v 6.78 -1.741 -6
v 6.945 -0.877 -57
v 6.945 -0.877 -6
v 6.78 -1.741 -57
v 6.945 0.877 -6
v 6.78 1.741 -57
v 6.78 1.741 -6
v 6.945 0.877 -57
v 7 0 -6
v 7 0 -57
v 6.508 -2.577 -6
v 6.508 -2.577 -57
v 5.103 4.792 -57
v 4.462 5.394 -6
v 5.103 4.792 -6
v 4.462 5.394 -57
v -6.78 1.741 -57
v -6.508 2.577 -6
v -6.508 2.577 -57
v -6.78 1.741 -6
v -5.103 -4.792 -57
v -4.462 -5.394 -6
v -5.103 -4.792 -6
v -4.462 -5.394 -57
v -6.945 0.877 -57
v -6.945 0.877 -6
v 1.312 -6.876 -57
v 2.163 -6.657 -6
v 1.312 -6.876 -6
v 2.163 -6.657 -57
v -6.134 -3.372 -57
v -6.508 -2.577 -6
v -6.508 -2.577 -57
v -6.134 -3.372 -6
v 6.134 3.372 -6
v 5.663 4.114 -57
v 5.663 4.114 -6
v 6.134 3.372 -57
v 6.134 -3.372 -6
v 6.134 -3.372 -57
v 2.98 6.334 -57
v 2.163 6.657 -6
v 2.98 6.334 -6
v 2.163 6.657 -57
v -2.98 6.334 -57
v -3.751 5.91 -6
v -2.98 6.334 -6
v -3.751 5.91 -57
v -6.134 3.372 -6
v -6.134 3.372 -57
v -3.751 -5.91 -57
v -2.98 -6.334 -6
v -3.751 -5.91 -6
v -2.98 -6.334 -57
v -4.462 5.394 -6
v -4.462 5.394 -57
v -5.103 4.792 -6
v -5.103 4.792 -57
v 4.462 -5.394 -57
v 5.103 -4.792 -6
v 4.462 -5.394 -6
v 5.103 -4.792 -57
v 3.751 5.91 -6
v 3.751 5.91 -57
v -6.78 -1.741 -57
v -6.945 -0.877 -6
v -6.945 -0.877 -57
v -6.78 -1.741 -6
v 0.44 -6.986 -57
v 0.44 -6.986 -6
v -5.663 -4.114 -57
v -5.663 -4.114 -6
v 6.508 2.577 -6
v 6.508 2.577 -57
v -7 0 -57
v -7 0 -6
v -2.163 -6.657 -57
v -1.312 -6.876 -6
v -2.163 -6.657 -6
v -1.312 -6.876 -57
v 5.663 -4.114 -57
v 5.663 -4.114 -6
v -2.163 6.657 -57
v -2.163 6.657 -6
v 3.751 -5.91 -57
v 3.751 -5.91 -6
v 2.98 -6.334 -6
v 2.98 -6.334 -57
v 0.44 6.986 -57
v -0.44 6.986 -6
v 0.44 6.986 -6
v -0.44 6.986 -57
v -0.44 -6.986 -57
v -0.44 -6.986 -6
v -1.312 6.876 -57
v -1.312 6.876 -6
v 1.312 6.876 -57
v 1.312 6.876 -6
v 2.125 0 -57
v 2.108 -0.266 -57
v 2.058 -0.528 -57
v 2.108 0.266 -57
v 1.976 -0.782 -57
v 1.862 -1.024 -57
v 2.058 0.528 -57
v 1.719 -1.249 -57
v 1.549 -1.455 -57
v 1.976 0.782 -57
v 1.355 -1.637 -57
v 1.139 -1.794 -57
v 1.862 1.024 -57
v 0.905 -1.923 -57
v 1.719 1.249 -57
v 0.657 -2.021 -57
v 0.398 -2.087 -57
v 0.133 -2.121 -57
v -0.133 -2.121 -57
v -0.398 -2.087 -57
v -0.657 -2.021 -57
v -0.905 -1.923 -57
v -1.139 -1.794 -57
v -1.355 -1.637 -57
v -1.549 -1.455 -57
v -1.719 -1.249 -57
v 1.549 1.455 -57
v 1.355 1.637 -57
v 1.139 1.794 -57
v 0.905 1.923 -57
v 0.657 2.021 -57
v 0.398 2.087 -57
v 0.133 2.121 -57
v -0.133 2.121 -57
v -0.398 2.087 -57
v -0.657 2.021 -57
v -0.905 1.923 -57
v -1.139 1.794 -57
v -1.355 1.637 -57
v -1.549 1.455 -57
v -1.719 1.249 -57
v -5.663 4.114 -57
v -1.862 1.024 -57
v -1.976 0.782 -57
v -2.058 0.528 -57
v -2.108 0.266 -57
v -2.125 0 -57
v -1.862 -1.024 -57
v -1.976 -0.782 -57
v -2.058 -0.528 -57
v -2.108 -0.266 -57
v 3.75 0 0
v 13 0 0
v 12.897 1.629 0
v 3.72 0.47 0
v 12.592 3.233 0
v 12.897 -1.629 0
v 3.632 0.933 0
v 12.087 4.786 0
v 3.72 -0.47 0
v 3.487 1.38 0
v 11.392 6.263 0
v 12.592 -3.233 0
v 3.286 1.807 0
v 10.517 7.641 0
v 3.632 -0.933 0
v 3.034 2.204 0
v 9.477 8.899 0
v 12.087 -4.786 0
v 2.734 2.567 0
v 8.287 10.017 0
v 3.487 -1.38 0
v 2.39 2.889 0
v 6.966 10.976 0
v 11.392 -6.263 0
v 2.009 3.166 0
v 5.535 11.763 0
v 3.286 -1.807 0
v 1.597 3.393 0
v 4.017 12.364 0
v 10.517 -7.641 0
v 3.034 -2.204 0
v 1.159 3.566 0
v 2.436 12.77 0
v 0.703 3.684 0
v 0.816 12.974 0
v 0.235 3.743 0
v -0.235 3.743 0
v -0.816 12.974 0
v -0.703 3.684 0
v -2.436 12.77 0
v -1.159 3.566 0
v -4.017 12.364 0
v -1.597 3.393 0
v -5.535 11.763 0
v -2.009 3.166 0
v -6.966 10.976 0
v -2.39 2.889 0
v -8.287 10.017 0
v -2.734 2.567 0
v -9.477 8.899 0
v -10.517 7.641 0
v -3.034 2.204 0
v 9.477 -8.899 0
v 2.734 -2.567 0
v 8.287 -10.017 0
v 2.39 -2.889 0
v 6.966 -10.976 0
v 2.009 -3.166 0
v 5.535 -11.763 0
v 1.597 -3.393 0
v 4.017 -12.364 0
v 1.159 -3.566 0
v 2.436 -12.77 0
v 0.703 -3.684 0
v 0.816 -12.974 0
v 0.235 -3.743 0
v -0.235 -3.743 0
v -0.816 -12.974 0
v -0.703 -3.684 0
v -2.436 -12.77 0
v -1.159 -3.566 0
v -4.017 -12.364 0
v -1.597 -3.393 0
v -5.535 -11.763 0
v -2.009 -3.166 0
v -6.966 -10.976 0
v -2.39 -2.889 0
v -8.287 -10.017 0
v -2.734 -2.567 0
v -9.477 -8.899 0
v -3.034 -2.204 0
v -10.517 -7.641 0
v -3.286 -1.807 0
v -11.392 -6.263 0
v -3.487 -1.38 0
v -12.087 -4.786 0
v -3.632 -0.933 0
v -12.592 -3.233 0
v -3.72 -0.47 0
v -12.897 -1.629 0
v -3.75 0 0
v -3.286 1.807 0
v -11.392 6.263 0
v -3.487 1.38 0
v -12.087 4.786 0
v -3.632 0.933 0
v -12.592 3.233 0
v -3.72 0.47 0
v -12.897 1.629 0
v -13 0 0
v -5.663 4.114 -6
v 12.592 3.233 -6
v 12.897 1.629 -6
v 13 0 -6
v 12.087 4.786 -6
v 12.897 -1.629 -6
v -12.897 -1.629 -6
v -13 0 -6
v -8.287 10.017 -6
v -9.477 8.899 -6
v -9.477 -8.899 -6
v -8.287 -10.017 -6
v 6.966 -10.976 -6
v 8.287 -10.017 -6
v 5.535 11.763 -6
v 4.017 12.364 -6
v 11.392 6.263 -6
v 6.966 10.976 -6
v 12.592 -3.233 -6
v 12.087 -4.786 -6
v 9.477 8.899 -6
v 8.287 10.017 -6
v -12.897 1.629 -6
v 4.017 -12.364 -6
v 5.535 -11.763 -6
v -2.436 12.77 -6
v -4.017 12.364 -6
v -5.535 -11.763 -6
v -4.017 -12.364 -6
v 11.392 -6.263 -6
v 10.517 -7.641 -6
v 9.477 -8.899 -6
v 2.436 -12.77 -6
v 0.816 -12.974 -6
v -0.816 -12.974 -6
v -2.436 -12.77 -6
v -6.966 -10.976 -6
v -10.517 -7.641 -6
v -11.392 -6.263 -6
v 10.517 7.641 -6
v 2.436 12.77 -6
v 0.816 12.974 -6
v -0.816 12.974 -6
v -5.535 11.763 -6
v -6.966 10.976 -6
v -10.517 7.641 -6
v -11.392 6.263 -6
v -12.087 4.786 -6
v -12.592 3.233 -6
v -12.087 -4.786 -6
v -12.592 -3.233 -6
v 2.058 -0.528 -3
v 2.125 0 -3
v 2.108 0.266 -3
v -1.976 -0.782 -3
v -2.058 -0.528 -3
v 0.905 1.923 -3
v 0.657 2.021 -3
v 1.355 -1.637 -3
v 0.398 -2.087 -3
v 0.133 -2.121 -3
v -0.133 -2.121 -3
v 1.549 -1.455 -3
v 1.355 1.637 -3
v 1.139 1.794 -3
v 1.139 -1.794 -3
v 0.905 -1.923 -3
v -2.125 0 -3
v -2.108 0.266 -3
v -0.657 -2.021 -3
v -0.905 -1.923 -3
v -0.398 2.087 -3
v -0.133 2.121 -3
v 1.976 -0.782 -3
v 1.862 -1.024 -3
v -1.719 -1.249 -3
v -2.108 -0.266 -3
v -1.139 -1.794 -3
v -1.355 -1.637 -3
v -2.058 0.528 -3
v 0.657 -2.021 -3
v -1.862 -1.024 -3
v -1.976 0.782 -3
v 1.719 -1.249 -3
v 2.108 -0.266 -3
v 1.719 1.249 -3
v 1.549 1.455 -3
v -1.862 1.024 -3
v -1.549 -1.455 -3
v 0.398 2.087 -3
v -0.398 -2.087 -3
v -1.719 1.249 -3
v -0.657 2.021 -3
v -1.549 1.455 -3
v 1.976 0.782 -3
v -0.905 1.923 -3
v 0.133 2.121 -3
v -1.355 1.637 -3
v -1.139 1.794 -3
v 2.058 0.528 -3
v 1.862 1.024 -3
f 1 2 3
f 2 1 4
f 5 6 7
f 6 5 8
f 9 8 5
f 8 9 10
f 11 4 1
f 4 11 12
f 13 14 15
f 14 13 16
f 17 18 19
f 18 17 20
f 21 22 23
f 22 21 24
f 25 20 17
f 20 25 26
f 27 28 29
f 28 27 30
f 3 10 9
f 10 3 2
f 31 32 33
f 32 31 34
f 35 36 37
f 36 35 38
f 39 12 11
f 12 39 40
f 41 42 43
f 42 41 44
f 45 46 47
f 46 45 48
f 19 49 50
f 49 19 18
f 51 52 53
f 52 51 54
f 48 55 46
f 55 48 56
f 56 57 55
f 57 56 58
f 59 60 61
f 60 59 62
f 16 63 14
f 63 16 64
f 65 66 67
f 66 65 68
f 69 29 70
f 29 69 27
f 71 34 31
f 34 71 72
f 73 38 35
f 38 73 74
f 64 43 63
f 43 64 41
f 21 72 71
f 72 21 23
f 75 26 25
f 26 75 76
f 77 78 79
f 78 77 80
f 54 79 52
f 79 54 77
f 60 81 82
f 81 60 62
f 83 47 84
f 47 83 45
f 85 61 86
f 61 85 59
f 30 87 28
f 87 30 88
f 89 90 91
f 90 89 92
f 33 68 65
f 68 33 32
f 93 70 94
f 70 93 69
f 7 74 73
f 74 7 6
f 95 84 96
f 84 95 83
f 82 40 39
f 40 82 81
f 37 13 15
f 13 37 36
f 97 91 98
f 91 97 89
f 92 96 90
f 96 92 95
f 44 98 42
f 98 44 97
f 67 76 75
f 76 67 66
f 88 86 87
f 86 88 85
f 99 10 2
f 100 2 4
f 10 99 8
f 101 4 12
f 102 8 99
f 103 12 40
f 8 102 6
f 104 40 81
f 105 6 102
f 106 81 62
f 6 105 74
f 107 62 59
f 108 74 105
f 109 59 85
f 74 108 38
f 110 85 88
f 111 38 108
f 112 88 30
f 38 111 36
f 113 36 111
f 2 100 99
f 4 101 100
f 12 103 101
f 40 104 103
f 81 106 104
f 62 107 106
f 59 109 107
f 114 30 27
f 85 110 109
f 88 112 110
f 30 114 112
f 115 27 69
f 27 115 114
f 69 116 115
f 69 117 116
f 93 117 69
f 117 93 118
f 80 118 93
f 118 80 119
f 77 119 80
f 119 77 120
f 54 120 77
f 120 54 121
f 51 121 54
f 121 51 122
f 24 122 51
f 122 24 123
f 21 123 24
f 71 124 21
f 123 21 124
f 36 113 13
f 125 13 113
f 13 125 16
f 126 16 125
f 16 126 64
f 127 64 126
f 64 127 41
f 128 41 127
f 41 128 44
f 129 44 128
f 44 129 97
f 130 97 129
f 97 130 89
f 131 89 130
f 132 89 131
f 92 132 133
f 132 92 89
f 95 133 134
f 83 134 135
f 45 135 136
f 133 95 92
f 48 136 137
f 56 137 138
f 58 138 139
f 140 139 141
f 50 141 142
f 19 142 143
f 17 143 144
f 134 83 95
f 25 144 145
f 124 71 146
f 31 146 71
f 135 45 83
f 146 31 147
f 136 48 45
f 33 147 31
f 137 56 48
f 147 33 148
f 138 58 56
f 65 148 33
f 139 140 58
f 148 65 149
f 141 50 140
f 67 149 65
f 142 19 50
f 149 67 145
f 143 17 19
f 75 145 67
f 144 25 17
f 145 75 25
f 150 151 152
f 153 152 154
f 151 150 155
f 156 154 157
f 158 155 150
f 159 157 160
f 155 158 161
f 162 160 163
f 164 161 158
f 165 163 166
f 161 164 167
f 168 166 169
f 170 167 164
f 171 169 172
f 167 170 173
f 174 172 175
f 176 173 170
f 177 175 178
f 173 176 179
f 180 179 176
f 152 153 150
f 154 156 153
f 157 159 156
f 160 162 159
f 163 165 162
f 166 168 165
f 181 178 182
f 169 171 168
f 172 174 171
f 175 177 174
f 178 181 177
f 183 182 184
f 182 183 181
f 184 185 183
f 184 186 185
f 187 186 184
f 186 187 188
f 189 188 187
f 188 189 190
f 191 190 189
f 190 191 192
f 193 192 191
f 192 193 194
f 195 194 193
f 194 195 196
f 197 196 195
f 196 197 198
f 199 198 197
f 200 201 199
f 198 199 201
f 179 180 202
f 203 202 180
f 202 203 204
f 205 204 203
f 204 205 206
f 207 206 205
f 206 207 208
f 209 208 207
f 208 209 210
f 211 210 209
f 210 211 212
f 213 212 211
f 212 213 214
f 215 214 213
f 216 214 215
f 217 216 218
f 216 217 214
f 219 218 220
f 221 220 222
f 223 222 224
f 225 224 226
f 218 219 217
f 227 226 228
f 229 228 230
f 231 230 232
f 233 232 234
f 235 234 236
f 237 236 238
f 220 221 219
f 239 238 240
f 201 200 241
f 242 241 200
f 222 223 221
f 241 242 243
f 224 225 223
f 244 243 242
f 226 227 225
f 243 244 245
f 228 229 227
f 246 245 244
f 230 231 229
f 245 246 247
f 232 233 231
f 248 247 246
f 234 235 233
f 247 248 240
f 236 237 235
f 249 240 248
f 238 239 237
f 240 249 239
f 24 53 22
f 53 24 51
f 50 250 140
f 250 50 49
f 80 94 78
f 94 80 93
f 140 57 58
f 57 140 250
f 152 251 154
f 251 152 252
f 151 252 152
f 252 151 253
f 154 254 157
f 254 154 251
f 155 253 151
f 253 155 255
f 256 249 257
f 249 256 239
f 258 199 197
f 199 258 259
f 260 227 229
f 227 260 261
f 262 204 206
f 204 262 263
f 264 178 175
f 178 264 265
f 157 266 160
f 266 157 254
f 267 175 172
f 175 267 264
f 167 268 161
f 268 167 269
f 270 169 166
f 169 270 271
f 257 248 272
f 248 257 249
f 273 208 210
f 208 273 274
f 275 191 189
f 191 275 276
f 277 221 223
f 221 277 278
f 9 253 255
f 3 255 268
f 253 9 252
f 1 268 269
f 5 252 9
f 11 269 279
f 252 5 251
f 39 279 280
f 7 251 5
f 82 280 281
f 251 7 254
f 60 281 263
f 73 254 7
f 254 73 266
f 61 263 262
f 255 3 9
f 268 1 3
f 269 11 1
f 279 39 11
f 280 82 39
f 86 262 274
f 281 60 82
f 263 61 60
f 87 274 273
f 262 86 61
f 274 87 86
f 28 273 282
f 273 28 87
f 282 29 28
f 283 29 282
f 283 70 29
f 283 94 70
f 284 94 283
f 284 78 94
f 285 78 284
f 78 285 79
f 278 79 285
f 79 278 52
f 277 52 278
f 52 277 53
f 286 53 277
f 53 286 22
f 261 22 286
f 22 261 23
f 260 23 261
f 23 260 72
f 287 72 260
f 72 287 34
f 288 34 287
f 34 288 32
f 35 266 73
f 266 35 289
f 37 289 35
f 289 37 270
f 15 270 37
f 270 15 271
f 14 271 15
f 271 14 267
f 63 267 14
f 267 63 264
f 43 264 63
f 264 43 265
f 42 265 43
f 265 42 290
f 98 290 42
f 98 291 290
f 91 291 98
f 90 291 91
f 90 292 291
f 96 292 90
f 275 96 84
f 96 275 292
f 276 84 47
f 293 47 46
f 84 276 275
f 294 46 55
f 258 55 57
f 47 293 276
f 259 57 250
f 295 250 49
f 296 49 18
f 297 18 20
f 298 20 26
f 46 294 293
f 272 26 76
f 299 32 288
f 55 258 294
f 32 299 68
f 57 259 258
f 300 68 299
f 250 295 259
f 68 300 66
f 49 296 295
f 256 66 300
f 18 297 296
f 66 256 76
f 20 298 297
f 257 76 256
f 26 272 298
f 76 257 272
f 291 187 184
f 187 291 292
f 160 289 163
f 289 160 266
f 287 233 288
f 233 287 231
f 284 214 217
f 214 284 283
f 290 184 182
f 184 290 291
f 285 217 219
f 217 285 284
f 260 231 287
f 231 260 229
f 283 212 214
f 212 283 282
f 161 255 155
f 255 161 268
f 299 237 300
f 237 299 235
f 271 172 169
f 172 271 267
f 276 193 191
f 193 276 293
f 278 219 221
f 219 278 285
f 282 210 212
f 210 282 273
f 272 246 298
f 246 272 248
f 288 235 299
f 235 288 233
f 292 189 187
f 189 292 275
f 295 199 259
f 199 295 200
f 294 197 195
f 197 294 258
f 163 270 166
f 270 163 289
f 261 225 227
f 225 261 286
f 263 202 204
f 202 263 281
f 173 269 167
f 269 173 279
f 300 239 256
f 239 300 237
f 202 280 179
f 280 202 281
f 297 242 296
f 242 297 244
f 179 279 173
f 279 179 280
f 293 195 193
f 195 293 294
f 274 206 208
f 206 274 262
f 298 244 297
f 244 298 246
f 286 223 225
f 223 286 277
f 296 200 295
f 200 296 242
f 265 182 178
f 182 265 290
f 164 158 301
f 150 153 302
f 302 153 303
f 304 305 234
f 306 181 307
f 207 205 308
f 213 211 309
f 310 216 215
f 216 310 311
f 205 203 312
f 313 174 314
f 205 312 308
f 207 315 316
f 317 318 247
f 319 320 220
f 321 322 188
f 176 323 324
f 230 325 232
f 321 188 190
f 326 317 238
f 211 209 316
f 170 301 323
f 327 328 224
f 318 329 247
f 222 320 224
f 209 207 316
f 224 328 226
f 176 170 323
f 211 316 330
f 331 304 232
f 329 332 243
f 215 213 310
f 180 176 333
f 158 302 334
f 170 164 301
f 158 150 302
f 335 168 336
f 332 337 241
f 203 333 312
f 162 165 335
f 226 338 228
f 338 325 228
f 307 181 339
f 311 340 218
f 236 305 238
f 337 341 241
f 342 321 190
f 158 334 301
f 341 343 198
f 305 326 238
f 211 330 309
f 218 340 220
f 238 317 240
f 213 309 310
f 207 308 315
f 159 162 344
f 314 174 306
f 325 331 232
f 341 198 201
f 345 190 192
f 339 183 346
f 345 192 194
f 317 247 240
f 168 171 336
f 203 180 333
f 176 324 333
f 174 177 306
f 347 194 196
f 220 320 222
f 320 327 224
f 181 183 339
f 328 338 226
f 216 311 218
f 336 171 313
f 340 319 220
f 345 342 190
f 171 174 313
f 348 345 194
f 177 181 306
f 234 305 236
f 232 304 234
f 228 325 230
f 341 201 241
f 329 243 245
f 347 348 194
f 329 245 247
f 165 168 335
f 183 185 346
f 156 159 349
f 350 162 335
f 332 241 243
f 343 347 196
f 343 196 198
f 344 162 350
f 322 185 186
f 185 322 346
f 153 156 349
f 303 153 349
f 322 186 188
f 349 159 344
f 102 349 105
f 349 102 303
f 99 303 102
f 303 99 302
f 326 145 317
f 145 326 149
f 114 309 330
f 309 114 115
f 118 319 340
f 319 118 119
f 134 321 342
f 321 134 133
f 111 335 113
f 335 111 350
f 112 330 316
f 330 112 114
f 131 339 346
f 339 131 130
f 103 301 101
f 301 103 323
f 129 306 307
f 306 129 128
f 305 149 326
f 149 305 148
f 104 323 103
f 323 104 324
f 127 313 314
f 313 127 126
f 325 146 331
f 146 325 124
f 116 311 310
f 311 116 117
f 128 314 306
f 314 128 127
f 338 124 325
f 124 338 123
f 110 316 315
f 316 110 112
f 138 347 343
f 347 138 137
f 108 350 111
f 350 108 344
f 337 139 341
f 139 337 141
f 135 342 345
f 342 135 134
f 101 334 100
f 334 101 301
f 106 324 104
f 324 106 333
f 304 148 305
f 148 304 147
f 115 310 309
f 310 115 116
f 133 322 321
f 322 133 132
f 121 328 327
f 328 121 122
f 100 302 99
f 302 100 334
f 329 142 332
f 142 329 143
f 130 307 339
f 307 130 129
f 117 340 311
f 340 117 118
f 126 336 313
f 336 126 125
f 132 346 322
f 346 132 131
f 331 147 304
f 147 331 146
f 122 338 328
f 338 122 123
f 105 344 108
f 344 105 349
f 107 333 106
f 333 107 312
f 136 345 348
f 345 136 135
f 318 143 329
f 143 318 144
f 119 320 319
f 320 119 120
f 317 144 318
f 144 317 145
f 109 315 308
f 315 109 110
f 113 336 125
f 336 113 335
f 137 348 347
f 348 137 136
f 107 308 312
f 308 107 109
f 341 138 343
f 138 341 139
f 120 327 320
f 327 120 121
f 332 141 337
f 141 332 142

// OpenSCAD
$fn = 50;


difference() {
	union() {
		translate(v = [0, 0, -57.0000000000]) {
			cylinder(h = 57, r = 7.0000000000);
		}
		translate(v = [0, 0, -6.0000000000]) {
			cylinder(h = 6, r = 13.0000000000);
		}
	}
	union() {
		translate(v = [0, 0, 0]) {
			rotate(a = [0, 0, 0]) {
				difference() {
					union() {
						#translate(v = [0, 0, -57.0000000000]) {
							cylinder(h = 57, r = 2.0000000000);
						}
						#translate(v = [0, 0, -3]) {
							cylinder(h = 3, r1 = 2.1250000000, r2 = 3.7500000000);
						}
						#translate(v = [0, 0, -57.0000000000]) {
							cylinder(h = 57, r = 2.1250000000);
						}
						#translate(v = [0, 0, -57.0000000000]) {
							cylinder(h = 57, r = 2.0000000000);
						}
					}
					union();
				}
			}
		}
	}
}
